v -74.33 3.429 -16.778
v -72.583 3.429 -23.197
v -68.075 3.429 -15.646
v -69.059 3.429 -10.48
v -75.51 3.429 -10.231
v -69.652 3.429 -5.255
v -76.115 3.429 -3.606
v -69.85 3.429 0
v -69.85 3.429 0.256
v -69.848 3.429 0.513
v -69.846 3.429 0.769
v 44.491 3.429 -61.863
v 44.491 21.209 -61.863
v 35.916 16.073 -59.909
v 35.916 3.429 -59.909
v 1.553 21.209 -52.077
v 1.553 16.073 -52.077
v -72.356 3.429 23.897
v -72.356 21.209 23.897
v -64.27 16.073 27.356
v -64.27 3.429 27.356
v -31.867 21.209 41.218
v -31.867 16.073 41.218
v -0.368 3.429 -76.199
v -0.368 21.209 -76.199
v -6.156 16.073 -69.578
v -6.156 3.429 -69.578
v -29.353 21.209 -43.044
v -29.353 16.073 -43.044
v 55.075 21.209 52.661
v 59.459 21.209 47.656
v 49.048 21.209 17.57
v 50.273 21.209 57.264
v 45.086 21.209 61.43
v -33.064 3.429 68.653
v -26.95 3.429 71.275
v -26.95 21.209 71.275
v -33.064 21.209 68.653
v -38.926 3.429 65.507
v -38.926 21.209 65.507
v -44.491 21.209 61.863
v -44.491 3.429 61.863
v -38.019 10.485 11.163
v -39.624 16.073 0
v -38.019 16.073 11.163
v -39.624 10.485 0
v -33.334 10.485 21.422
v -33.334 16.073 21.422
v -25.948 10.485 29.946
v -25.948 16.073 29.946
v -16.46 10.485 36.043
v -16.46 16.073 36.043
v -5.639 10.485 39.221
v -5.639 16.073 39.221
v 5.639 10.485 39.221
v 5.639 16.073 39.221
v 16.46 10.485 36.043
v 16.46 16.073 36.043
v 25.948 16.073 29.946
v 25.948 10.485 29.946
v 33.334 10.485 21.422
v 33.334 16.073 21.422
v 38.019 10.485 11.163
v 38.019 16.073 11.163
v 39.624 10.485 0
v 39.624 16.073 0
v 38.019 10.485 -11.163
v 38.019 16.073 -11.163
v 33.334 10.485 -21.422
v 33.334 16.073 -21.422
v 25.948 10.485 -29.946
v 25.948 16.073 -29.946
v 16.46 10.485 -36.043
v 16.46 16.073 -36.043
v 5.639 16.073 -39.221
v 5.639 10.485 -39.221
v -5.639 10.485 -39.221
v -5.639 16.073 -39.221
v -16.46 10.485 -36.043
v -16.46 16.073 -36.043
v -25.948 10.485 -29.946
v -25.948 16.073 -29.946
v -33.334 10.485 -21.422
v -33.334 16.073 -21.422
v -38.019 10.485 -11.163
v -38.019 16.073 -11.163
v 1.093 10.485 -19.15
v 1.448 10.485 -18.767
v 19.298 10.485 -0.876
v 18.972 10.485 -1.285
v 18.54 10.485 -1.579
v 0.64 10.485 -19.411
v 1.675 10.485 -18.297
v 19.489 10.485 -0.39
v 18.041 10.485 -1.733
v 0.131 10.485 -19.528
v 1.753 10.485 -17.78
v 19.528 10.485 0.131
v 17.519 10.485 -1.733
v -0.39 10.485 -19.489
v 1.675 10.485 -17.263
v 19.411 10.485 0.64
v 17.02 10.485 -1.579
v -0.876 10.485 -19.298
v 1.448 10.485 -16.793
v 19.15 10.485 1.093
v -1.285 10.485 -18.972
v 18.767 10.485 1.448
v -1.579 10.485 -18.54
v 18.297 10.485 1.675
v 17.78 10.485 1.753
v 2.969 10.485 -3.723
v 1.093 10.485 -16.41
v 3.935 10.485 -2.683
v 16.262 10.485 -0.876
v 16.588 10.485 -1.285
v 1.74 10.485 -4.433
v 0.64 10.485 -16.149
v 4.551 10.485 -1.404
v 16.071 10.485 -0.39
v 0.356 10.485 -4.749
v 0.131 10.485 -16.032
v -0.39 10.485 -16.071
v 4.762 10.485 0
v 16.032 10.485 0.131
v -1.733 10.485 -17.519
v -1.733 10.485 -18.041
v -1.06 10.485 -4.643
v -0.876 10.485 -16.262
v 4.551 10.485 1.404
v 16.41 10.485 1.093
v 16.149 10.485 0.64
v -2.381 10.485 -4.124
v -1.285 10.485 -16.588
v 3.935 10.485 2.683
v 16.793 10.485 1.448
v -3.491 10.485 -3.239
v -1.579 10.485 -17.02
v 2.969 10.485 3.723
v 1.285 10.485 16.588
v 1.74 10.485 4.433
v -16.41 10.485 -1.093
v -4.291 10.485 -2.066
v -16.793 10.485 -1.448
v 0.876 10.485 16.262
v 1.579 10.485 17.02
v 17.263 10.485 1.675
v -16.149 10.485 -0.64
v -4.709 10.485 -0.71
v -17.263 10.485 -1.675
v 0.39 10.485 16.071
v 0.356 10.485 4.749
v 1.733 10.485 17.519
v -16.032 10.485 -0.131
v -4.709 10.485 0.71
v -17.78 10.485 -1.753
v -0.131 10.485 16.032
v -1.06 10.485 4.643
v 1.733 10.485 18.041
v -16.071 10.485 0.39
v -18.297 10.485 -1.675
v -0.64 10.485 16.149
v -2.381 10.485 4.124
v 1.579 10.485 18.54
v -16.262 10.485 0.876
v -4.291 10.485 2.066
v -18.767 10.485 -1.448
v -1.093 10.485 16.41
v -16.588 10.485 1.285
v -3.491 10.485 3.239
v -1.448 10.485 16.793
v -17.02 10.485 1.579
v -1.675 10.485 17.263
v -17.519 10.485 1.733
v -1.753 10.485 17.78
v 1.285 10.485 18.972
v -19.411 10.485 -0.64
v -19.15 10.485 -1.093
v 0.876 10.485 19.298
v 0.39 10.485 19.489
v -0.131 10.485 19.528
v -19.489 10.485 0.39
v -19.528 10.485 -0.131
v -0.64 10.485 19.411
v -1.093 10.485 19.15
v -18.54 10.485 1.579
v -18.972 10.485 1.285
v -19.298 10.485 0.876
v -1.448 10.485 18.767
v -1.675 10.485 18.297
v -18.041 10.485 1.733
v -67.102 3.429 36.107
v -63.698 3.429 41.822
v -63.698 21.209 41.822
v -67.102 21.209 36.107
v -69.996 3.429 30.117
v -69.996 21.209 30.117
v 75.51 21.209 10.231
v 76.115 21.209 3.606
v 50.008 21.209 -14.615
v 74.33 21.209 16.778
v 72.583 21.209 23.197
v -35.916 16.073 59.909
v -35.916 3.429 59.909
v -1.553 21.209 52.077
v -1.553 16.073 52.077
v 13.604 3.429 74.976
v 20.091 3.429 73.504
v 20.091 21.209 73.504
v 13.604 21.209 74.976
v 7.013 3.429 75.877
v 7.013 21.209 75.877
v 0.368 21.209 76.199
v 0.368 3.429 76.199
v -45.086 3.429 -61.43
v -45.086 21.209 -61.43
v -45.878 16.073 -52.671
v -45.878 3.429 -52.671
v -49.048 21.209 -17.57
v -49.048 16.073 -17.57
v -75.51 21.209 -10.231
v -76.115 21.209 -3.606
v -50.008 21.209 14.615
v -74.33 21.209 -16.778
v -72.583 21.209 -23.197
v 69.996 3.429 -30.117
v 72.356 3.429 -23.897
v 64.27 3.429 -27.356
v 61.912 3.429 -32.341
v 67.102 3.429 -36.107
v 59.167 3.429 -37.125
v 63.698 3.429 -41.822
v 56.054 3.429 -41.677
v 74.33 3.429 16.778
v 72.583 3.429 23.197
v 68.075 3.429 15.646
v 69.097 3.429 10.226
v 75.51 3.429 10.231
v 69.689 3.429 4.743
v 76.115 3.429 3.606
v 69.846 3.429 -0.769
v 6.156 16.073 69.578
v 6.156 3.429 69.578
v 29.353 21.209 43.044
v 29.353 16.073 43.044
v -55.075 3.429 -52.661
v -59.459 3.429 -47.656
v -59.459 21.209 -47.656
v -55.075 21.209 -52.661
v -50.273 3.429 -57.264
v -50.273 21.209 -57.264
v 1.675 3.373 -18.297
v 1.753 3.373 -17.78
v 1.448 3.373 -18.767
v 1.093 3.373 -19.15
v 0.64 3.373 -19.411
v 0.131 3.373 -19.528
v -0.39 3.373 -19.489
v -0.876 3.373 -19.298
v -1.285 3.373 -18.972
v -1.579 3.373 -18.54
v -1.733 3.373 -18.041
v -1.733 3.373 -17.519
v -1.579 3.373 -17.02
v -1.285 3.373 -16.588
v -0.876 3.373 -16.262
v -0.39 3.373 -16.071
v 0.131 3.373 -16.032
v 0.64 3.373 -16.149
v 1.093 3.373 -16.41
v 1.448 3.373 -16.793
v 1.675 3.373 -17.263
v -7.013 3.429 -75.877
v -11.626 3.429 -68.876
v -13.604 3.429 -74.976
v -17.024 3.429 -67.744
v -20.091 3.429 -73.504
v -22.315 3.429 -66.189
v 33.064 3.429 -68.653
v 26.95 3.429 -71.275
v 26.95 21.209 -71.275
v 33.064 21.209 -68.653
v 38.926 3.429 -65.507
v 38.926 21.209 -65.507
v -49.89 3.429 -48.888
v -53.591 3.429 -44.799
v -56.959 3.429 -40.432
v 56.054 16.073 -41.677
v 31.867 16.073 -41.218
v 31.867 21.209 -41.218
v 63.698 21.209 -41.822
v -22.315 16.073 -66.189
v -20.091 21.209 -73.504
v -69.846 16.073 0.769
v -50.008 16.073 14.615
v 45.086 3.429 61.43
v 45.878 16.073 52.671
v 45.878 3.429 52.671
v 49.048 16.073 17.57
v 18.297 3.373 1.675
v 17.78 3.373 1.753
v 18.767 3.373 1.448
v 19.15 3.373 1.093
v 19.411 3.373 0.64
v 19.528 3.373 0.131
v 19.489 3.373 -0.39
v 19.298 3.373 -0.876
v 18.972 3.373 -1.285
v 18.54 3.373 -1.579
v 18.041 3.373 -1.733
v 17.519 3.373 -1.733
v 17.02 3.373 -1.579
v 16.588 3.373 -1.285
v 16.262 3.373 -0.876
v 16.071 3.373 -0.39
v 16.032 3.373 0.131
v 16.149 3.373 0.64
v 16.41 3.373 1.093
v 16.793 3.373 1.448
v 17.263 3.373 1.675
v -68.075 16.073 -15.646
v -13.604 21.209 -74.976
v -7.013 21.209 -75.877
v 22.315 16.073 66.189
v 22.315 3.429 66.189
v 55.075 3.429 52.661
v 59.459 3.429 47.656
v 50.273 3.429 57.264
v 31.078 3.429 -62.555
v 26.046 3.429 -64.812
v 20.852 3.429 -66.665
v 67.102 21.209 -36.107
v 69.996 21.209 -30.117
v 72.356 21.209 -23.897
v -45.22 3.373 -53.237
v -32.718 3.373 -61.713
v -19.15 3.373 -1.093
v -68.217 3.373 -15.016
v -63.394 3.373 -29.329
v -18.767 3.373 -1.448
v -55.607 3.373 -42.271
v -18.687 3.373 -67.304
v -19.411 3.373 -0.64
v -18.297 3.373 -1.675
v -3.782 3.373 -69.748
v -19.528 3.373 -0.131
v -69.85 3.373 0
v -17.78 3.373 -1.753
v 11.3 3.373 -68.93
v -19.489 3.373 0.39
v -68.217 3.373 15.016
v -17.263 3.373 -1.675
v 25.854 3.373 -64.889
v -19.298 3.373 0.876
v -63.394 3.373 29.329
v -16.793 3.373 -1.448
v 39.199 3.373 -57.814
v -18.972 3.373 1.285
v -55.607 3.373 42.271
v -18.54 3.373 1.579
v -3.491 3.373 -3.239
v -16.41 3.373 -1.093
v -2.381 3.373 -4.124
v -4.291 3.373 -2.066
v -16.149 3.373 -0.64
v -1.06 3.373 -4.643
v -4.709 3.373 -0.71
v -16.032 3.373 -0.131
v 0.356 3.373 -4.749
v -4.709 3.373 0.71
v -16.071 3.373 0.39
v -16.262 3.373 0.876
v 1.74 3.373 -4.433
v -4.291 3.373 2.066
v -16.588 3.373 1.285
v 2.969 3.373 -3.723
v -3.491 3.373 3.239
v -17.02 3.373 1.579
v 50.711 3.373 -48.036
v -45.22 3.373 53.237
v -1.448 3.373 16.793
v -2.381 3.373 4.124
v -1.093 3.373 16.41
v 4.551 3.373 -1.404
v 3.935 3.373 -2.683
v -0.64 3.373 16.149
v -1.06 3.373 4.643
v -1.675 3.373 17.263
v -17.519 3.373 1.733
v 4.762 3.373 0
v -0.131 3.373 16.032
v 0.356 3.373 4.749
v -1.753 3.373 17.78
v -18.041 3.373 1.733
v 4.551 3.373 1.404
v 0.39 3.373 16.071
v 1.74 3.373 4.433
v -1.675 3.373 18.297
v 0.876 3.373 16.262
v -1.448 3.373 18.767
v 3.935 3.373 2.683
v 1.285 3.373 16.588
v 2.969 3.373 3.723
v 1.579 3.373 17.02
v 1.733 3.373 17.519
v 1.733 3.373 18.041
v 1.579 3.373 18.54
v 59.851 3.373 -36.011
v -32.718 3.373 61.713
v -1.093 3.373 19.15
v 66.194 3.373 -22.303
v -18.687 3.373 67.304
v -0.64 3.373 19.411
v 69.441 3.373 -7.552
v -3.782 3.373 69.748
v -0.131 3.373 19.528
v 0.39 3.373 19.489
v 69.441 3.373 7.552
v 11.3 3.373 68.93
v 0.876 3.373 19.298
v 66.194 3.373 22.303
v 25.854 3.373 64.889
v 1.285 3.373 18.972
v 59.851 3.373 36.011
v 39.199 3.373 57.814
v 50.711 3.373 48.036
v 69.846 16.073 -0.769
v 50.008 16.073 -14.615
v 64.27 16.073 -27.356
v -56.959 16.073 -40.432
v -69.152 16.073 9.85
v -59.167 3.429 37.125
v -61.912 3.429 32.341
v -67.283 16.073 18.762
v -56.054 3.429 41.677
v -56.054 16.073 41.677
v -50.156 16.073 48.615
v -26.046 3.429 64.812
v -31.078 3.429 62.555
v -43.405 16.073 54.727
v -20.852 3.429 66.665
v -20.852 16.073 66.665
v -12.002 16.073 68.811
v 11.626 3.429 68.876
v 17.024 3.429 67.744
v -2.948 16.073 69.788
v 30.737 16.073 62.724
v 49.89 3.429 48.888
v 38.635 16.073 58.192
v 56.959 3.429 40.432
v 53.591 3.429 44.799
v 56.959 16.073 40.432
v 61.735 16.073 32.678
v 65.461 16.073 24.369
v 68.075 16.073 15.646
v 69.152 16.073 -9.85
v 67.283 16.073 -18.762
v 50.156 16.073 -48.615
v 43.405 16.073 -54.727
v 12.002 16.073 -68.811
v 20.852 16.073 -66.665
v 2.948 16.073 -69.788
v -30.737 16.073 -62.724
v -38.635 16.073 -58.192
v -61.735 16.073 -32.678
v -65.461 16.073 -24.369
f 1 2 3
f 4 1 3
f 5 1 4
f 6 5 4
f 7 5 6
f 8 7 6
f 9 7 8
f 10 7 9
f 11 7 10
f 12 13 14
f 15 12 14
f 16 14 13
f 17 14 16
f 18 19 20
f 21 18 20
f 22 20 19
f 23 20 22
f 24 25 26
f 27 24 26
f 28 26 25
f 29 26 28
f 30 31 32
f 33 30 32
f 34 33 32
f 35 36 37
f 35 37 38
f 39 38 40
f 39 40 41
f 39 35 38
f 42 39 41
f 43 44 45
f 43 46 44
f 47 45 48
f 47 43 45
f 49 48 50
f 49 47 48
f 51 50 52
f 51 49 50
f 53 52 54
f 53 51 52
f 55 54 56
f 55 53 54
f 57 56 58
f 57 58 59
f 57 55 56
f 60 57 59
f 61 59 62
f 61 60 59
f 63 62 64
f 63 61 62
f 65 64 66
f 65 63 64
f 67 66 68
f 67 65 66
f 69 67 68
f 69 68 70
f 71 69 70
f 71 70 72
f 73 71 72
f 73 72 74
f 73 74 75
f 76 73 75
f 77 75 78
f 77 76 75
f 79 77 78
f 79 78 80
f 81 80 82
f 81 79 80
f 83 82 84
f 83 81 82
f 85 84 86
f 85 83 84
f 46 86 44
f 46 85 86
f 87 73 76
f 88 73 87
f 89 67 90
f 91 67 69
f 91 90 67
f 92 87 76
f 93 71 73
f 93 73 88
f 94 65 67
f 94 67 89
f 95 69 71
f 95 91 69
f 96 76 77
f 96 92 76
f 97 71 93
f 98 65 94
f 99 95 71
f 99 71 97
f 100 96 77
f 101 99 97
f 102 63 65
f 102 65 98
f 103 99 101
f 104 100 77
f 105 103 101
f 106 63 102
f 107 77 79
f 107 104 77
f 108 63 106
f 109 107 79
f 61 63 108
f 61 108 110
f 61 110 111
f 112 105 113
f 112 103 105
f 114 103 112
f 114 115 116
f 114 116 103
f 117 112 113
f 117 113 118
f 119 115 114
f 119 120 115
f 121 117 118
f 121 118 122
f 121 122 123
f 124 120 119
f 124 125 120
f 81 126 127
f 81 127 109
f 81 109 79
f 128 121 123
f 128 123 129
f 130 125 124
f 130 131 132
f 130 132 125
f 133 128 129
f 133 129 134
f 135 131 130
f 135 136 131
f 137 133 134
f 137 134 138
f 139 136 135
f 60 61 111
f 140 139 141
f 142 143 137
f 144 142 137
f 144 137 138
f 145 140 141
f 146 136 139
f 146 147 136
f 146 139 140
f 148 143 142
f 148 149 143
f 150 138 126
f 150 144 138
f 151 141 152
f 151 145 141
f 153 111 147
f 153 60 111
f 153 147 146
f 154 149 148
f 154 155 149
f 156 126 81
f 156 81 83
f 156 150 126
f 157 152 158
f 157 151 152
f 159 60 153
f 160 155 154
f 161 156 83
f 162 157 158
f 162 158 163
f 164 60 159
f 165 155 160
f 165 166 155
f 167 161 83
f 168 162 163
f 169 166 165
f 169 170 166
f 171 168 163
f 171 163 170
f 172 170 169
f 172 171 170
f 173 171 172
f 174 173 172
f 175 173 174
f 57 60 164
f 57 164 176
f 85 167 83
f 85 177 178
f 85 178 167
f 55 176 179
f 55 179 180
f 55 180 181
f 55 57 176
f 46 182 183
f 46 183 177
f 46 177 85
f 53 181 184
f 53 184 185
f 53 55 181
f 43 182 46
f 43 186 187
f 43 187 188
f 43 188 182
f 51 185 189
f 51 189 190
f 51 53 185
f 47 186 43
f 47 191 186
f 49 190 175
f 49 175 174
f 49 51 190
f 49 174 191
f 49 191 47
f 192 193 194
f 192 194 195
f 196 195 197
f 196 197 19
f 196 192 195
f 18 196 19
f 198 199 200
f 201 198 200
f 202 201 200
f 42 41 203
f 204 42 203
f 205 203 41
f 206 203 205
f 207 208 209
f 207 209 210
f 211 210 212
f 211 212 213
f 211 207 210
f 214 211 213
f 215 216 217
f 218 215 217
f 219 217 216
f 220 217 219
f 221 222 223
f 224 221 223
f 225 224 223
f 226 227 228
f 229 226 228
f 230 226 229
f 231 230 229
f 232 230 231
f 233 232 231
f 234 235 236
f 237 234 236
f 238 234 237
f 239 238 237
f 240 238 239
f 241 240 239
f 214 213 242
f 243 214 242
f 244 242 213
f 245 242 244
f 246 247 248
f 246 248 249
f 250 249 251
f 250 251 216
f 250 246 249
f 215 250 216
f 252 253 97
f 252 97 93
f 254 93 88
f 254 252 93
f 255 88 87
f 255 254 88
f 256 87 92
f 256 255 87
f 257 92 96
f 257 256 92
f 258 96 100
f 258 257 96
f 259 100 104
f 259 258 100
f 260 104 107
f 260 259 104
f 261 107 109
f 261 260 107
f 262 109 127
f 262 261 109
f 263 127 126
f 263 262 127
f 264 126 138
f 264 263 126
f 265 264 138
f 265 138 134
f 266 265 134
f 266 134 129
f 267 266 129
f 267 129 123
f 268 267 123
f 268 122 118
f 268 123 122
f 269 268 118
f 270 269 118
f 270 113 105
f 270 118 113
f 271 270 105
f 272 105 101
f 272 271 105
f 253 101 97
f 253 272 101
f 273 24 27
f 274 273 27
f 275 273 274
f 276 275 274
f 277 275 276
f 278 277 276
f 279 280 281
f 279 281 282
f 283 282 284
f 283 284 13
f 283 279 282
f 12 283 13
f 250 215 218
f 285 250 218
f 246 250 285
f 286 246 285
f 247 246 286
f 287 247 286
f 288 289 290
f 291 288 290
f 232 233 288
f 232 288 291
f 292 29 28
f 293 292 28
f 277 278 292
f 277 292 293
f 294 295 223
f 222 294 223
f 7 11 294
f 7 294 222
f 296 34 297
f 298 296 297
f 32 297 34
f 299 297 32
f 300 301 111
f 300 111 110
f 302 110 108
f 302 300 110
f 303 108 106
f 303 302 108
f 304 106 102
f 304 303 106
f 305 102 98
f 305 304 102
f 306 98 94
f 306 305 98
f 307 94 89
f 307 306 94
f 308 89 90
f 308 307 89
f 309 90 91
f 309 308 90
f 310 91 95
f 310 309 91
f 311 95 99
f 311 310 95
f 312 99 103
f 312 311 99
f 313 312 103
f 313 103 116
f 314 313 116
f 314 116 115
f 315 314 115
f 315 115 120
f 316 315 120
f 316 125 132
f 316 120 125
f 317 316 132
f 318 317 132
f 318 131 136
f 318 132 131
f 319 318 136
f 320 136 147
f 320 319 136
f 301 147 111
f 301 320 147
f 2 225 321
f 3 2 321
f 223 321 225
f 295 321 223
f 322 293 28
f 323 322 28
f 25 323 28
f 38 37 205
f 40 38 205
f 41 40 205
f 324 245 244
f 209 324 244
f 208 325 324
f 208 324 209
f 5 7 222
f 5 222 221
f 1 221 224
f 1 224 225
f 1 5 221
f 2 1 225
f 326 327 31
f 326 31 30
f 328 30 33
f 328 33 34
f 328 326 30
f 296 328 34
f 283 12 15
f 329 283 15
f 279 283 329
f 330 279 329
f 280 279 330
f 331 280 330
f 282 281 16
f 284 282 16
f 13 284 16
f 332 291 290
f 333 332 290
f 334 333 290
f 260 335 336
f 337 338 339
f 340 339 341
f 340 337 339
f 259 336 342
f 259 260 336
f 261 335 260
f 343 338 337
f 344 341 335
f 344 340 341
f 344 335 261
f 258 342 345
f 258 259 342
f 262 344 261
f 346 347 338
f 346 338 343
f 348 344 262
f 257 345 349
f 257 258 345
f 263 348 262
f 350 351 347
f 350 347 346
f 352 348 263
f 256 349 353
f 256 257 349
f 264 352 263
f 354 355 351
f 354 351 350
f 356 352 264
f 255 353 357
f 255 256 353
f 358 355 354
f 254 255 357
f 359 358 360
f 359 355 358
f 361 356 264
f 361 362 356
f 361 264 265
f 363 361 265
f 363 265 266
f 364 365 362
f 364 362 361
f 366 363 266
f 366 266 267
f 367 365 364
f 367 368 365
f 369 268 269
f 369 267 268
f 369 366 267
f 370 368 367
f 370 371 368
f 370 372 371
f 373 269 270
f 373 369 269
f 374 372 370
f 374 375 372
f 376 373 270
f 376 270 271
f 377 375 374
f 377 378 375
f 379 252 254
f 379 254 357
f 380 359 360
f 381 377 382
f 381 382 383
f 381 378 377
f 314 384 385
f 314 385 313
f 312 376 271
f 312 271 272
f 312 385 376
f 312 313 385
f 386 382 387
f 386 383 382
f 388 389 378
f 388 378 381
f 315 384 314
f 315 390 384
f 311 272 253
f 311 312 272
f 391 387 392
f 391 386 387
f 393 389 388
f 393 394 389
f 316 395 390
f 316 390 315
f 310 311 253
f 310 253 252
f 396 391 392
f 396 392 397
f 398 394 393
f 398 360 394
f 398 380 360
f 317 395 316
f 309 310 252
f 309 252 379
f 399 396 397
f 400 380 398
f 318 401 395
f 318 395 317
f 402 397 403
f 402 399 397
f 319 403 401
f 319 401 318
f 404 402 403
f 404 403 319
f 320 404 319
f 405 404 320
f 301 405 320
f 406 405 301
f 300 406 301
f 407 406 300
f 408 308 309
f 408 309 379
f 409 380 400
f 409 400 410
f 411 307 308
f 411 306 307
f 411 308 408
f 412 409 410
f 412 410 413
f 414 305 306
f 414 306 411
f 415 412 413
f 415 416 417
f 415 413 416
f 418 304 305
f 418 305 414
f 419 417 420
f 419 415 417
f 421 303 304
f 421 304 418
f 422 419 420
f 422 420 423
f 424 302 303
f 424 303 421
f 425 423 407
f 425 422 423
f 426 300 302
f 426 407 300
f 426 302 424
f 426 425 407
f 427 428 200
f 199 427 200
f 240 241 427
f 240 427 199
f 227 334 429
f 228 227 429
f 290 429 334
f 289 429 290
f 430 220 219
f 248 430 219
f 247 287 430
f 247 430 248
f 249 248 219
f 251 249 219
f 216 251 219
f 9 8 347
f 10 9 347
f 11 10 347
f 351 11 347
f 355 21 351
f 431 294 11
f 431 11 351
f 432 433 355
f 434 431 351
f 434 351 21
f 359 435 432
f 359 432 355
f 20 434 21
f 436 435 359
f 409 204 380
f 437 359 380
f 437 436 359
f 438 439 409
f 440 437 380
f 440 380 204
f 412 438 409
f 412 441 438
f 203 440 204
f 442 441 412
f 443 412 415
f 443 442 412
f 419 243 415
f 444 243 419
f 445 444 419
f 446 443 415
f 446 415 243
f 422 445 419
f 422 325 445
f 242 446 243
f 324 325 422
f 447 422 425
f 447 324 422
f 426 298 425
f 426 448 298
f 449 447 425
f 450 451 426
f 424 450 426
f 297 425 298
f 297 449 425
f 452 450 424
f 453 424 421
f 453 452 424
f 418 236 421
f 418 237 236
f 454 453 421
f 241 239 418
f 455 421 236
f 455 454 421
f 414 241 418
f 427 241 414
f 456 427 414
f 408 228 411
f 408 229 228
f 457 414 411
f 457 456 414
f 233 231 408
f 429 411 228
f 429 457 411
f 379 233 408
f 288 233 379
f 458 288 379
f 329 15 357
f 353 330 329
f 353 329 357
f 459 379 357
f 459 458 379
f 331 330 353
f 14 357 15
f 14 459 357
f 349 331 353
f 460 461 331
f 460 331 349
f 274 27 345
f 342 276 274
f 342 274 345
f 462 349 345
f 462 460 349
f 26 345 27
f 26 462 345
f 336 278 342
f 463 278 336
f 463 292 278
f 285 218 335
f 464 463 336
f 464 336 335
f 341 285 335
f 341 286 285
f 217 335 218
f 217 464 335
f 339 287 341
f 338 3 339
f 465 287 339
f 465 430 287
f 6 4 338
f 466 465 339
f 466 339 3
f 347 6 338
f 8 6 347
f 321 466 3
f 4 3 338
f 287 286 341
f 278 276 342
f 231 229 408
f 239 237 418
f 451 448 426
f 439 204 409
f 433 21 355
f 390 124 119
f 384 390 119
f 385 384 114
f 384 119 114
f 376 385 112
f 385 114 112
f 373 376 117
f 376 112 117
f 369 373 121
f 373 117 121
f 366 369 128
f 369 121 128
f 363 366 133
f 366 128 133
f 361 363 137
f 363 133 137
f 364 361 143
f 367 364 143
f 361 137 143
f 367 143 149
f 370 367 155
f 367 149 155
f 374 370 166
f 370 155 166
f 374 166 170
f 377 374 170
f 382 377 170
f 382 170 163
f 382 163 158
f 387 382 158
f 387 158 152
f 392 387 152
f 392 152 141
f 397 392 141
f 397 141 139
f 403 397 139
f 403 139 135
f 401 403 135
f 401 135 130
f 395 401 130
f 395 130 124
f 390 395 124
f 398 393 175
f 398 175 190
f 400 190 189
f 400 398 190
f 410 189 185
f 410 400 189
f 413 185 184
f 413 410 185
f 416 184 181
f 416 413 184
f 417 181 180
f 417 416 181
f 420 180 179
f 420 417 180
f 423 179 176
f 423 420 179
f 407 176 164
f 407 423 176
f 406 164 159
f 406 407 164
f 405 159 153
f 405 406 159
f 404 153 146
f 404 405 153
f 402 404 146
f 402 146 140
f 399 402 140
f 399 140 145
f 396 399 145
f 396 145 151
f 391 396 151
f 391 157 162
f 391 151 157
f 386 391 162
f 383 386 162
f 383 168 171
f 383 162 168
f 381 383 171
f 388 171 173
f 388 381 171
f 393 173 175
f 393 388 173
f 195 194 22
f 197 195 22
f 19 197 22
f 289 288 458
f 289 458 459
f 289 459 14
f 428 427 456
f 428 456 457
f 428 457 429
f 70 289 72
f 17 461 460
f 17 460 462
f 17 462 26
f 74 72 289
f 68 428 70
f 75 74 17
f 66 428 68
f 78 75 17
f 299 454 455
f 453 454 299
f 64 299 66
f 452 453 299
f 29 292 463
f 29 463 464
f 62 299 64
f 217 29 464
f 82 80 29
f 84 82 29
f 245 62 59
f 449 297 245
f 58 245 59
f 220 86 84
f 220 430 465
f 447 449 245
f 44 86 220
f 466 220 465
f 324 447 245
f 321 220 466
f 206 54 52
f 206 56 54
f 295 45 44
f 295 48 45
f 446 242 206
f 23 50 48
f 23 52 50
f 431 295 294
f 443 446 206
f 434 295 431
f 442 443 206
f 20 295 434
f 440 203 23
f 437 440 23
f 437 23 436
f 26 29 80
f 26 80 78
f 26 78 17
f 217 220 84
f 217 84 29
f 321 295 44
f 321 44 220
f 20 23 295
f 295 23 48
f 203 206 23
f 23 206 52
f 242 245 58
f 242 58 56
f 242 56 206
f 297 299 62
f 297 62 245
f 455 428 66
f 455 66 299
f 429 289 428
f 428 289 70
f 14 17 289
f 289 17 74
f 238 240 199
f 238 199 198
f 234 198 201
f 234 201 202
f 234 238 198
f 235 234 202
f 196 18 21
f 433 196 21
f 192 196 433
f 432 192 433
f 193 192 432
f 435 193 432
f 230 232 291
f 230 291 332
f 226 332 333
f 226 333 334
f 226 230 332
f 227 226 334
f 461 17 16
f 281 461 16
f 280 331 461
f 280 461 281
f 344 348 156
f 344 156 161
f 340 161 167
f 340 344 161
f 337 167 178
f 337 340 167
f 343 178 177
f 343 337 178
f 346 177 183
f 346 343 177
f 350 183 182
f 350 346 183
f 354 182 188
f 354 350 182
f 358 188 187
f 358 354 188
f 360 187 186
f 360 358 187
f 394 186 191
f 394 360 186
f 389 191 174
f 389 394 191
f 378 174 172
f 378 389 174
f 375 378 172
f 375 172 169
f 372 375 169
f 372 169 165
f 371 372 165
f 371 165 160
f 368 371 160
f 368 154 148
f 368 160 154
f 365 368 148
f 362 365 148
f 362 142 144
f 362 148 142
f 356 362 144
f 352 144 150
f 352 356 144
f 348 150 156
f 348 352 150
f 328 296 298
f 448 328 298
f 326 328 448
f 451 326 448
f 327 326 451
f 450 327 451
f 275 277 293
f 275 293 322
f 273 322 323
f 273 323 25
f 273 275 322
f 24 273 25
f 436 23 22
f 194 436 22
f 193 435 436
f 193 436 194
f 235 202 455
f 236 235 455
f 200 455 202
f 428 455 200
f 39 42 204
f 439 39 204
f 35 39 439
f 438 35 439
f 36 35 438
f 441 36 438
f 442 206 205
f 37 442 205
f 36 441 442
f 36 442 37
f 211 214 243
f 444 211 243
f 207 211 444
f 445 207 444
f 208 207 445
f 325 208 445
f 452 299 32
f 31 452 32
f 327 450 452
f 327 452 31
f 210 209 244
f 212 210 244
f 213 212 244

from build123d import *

# Parameters (mm, degrees)
GUIDE_START        = 3.429
GUIDE_VANES_DEPTH  = 17.78
CIRPATTERN4_COUNT  = 10
SKETCH6_R          = 1.7526
CUT_EXTRUDE1_DEPTH = 13.97
CIRPATTERN5_COUNT  = 4
SKETCH9_R          = 4.7625
CUT_EXTRUDE2_DEPTH = 7.62


with BuildPart() as part:
    # Sketch3 → Body (revolve)
    with BuildSketch(Plane.XY):
        Polygon((-69.85, 16.0734375), (-39.624, 16.0734375), (-39.624, 10.4854375), (0, 10.4854375), (0, 3.3734375), (-69.85, 3.3734375), align=None)
    revolve(axis=Axis((0, 0, 0), (0, 1, 0)))

    # Sketch4 → Guide Vanes (add)
    with BuildSketch(Plane(origin=(0, 0, 0), x_dir=(1, 0, 0), z_dir=(0, 1, 0)).offset(GUIDE_START)):
        with BuildLine():
            Line((1.553349961, 52.076946284), (26.95018459, 71.275013508))
            ThreePointArc((26.95018459, 71.275013508), (36.029244063, 67.144125374), (44.490941148, 61.862720242))
            Line((44.490941148, 61.862720242), (1.553349961, 52.076946284))
        make_face()
    guide_vanes = extrude(amount=GUIDE_VANES_DEPTH)

    # CirPattern4: Guide Vanes ×10 about axis
    cirpattern4_axis = Axis((0, 0, 0), (0, 1, 0))
    for i in range(1, CIRPATTERN4_COUNT):
        add(guide_vanes.rotate(cirpattern4_axis, i * 360 / CIRPATTERN4_COUNT))

    # Sketch6 → Cut-Extrude1 (cut)
    with BuildSketch(Plane(origin=(0, 0, 0), x_dir=(1, 0, 0), z_dir=(0, 1, 0))):
        with Locations((0, 17.78)):
            Circle(SKETCH6_R)
    cut_extrude1 = extrude(amount=CUT_EXTRUDE1_DEPTH, mode=Mode.SUBTRACT)

    # CirPattern5: Cut-Extrude1 ×4 about axis
    cirpattern5_axis = Axis((0, 0, 0), (0, 1, 0))
    for i in range(1, CIRPATTERN5_COUNT):
        add(cut_extrude1.rotate(cirpattern5_axis, i * 360 / CIRPATTERN5_COUNT), mode=Mode.SUBTRACT)

    # Sketch9 → Cut-Extrude2 (cut)
    with BuildSketch(Plane(origin=(0, 10.4854375, 0), x_dir=(1, 0, 0), z_dir=(0, 1, 0))):
        Circle(SKETCH9_R)
    extrude(amount=-CUT_EXTRUDE2_DEPTH, mode=Mode.SUBTRACT)


solid = part.part
